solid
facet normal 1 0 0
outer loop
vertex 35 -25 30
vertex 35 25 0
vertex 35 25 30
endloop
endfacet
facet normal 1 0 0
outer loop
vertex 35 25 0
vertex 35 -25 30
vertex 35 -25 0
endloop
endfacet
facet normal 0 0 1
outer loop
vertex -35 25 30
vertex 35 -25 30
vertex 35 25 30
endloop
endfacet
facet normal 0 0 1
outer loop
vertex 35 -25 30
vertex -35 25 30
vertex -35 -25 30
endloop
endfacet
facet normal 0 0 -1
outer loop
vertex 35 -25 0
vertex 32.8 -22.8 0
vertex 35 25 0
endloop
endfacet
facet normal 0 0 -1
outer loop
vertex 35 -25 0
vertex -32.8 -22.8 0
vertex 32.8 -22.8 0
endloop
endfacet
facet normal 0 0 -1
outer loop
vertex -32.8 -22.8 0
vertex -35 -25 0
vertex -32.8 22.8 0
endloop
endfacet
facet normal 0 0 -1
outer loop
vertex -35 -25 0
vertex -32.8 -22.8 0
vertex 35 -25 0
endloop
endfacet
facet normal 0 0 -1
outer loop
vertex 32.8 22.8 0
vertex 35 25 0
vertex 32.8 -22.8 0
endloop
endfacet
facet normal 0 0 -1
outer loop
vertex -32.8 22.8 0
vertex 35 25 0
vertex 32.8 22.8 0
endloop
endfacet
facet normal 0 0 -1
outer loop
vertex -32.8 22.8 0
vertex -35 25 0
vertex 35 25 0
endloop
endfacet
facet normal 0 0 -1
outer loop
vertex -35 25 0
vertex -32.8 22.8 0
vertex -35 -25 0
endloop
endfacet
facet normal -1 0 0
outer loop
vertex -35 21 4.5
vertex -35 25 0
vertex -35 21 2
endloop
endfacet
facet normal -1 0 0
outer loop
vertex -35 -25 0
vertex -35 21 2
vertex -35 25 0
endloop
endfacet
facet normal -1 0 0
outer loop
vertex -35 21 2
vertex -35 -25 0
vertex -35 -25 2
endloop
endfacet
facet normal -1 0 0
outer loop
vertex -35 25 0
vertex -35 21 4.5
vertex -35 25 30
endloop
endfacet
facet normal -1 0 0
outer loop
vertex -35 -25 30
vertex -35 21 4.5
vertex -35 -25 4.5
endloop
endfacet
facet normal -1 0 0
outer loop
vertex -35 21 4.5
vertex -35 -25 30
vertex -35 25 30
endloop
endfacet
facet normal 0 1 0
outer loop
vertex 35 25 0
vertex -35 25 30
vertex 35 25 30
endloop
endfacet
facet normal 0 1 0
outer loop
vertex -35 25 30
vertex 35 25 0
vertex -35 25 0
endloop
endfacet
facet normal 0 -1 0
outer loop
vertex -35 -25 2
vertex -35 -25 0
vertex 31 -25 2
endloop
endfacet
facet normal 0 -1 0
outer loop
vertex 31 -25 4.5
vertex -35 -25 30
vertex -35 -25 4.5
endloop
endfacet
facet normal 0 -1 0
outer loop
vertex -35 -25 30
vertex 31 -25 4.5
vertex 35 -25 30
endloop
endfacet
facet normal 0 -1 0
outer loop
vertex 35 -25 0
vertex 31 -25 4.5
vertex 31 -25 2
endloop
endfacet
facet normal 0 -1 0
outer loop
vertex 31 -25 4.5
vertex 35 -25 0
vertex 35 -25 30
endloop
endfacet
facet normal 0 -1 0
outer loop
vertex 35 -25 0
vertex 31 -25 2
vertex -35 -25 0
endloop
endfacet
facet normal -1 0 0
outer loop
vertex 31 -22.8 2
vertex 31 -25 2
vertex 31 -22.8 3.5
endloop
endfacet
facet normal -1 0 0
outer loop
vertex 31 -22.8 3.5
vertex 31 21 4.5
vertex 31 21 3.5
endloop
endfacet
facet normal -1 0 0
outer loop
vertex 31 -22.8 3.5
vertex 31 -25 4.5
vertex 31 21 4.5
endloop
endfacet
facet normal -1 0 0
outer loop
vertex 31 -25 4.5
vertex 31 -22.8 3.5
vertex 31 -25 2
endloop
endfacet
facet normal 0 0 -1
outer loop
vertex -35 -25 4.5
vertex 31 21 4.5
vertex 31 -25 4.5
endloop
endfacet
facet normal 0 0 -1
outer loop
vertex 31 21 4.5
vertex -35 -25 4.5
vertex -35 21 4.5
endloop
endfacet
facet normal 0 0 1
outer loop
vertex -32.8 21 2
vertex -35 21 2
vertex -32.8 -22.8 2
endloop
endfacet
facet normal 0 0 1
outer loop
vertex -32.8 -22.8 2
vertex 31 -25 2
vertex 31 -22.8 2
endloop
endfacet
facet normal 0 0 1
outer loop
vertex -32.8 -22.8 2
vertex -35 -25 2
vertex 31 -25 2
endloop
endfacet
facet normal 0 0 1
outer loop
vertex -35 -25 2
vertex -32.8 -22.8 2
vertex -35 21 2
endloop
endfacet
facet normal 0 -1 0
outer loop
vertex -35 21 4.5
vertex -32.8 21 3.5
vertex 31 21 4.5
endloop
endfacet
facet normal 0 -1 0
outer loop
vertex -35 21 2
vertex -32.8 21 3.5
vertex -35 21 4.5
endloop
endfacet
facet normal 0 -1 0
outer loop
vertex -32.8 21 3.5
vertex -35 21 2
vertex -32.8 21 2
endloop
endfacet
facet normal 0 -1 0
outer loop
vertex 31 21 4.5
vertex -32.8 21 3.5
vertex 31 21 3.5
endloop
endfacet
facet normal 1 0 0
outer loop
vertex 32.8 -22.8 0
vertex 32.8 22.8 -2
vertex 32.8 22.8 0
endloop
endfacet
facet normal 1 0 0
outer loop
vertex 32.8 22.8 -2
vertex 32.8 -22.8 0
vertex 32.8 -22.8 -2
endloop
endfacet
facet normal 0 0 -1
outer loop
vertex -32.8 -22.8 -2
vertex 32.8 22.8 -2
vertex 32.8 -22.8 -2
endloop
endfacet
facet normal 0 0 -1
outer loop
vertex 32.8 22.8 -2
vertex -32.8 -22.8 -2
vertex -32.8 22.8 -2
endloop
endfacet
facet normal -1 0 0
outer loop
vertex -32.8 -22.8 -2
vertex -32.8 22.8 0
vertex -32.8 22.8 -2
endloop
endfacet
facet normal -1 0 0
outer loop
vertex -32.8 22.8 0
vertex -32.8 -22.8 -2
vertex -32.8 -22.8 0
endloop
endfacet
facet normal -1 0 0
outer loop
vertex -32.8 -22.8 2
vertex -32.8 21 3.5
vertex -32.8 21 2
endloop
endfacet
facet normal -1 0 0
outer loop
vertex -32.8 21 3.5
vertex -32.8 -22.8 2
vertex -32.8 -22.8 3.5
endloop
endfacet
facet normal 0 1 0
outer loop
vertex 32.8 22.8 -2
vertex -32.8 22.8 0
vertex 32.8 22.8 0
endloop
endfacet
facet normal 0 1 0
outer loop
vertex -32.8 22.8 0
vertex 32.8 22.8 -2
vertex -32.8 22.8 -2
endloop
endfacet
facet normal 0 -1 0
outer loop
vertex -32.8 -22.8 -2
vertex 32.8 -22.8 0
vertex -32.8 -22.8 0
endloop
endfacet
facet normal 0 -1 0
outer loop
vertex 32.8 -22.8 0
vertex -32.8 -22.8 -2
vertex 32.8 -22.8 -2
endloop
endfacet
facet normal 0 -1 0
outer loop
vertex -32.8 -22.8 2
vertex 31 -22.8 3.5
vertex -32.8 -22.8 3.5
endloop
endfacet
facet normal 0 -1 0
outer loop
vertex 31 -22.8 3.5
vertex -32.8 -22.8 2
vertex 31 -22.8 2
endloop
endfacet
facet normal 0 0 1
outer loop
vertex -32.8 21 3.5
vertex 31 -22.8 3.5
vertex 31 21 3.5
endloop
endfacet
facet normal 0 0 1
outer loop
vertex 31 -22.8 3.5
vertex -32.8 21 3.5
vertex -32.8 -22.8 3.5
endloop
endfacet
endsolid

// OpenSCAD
// Two-part enclosure: box (left) and lid (right), printed side by side
// Units: mm

// ---- Box ----
box_outer_x = 70;    // outer length (X)
box_outer_y = 50;    // outer width (Y)
box_outer_z = 30;    // outer height (Z)
wall        = 2;     // side wall thickness
floor       = 2;     // floor thickness under open top

// ---- Lid ----
lip_x      = 65.6;   // lip outer length (X)
lip_y      = 45.6;   // lip outer width (Y)
lip_h      = 4;      // lip height above plate
lip_t      = 1.5;    // lip thickness (wall)
plate_t    = 2;      // plate thickness under lip
gap        = 0.2;    // clearance between lip and box opening

// ---- Misc ----
eps        = 0.5;    // cutter overshoot past faces
$fn        = 64;

// Derived
box_v  = box_outer_x * box_outer_y * box_outer_z;   // box volume
lip_v  = lip_x * lip_y * (lip_h + lip_t);            // lip volume
area   = lip_x * lip_y;                              // lip area

// Model
union() {
    // Box: solid outer block, open top (cut down to floor level)
    translate([-box_outer_x / 2, -box_outer_y / 2, 0])
        difference() {
            cube([box_outer_x, box_outer_y, box_outer_z]);
            translate([0, 0, floor])
                cube([box_outer_x - 2 * wall, box_outer_y - 2 * wall,
                      floor + eps]);                  // open-top cut
        }

    // Lid: plate on bed, lip on top of plate, centred on plate
    translate([-lip_x / 2, -lip_y / 2, 0])
        union() {
            translate([0, 0, -plate_t])
                cube([lip_x, lip_y, 2 * plate_t]);     // plate (through)
            translate([0, 0, plate_t])
                cube([lip_x, lip_y, lip_t]);           // lip
        }
}

// Check (commented out)
// translate([0, 0, -eps])
//     difference() {
//         translate([0, 0, 0])
//             cube([box_v, 1, 1]);                     // box volume
//         translate([0, 0, plate_t])
//             cube([area, lip_h + eps, 1]);           // lip volume
//     }
// translate([0, 0, -eps])
//     difference() {
//         translate([0, 0, 0])
//             cube([box_outer_x * box_outer_y, 1, 1]); // outer area
//         translate([0, 0, plate_t])
//             cube([area, lip_h + eps, 1]);           // lip area
//     }
